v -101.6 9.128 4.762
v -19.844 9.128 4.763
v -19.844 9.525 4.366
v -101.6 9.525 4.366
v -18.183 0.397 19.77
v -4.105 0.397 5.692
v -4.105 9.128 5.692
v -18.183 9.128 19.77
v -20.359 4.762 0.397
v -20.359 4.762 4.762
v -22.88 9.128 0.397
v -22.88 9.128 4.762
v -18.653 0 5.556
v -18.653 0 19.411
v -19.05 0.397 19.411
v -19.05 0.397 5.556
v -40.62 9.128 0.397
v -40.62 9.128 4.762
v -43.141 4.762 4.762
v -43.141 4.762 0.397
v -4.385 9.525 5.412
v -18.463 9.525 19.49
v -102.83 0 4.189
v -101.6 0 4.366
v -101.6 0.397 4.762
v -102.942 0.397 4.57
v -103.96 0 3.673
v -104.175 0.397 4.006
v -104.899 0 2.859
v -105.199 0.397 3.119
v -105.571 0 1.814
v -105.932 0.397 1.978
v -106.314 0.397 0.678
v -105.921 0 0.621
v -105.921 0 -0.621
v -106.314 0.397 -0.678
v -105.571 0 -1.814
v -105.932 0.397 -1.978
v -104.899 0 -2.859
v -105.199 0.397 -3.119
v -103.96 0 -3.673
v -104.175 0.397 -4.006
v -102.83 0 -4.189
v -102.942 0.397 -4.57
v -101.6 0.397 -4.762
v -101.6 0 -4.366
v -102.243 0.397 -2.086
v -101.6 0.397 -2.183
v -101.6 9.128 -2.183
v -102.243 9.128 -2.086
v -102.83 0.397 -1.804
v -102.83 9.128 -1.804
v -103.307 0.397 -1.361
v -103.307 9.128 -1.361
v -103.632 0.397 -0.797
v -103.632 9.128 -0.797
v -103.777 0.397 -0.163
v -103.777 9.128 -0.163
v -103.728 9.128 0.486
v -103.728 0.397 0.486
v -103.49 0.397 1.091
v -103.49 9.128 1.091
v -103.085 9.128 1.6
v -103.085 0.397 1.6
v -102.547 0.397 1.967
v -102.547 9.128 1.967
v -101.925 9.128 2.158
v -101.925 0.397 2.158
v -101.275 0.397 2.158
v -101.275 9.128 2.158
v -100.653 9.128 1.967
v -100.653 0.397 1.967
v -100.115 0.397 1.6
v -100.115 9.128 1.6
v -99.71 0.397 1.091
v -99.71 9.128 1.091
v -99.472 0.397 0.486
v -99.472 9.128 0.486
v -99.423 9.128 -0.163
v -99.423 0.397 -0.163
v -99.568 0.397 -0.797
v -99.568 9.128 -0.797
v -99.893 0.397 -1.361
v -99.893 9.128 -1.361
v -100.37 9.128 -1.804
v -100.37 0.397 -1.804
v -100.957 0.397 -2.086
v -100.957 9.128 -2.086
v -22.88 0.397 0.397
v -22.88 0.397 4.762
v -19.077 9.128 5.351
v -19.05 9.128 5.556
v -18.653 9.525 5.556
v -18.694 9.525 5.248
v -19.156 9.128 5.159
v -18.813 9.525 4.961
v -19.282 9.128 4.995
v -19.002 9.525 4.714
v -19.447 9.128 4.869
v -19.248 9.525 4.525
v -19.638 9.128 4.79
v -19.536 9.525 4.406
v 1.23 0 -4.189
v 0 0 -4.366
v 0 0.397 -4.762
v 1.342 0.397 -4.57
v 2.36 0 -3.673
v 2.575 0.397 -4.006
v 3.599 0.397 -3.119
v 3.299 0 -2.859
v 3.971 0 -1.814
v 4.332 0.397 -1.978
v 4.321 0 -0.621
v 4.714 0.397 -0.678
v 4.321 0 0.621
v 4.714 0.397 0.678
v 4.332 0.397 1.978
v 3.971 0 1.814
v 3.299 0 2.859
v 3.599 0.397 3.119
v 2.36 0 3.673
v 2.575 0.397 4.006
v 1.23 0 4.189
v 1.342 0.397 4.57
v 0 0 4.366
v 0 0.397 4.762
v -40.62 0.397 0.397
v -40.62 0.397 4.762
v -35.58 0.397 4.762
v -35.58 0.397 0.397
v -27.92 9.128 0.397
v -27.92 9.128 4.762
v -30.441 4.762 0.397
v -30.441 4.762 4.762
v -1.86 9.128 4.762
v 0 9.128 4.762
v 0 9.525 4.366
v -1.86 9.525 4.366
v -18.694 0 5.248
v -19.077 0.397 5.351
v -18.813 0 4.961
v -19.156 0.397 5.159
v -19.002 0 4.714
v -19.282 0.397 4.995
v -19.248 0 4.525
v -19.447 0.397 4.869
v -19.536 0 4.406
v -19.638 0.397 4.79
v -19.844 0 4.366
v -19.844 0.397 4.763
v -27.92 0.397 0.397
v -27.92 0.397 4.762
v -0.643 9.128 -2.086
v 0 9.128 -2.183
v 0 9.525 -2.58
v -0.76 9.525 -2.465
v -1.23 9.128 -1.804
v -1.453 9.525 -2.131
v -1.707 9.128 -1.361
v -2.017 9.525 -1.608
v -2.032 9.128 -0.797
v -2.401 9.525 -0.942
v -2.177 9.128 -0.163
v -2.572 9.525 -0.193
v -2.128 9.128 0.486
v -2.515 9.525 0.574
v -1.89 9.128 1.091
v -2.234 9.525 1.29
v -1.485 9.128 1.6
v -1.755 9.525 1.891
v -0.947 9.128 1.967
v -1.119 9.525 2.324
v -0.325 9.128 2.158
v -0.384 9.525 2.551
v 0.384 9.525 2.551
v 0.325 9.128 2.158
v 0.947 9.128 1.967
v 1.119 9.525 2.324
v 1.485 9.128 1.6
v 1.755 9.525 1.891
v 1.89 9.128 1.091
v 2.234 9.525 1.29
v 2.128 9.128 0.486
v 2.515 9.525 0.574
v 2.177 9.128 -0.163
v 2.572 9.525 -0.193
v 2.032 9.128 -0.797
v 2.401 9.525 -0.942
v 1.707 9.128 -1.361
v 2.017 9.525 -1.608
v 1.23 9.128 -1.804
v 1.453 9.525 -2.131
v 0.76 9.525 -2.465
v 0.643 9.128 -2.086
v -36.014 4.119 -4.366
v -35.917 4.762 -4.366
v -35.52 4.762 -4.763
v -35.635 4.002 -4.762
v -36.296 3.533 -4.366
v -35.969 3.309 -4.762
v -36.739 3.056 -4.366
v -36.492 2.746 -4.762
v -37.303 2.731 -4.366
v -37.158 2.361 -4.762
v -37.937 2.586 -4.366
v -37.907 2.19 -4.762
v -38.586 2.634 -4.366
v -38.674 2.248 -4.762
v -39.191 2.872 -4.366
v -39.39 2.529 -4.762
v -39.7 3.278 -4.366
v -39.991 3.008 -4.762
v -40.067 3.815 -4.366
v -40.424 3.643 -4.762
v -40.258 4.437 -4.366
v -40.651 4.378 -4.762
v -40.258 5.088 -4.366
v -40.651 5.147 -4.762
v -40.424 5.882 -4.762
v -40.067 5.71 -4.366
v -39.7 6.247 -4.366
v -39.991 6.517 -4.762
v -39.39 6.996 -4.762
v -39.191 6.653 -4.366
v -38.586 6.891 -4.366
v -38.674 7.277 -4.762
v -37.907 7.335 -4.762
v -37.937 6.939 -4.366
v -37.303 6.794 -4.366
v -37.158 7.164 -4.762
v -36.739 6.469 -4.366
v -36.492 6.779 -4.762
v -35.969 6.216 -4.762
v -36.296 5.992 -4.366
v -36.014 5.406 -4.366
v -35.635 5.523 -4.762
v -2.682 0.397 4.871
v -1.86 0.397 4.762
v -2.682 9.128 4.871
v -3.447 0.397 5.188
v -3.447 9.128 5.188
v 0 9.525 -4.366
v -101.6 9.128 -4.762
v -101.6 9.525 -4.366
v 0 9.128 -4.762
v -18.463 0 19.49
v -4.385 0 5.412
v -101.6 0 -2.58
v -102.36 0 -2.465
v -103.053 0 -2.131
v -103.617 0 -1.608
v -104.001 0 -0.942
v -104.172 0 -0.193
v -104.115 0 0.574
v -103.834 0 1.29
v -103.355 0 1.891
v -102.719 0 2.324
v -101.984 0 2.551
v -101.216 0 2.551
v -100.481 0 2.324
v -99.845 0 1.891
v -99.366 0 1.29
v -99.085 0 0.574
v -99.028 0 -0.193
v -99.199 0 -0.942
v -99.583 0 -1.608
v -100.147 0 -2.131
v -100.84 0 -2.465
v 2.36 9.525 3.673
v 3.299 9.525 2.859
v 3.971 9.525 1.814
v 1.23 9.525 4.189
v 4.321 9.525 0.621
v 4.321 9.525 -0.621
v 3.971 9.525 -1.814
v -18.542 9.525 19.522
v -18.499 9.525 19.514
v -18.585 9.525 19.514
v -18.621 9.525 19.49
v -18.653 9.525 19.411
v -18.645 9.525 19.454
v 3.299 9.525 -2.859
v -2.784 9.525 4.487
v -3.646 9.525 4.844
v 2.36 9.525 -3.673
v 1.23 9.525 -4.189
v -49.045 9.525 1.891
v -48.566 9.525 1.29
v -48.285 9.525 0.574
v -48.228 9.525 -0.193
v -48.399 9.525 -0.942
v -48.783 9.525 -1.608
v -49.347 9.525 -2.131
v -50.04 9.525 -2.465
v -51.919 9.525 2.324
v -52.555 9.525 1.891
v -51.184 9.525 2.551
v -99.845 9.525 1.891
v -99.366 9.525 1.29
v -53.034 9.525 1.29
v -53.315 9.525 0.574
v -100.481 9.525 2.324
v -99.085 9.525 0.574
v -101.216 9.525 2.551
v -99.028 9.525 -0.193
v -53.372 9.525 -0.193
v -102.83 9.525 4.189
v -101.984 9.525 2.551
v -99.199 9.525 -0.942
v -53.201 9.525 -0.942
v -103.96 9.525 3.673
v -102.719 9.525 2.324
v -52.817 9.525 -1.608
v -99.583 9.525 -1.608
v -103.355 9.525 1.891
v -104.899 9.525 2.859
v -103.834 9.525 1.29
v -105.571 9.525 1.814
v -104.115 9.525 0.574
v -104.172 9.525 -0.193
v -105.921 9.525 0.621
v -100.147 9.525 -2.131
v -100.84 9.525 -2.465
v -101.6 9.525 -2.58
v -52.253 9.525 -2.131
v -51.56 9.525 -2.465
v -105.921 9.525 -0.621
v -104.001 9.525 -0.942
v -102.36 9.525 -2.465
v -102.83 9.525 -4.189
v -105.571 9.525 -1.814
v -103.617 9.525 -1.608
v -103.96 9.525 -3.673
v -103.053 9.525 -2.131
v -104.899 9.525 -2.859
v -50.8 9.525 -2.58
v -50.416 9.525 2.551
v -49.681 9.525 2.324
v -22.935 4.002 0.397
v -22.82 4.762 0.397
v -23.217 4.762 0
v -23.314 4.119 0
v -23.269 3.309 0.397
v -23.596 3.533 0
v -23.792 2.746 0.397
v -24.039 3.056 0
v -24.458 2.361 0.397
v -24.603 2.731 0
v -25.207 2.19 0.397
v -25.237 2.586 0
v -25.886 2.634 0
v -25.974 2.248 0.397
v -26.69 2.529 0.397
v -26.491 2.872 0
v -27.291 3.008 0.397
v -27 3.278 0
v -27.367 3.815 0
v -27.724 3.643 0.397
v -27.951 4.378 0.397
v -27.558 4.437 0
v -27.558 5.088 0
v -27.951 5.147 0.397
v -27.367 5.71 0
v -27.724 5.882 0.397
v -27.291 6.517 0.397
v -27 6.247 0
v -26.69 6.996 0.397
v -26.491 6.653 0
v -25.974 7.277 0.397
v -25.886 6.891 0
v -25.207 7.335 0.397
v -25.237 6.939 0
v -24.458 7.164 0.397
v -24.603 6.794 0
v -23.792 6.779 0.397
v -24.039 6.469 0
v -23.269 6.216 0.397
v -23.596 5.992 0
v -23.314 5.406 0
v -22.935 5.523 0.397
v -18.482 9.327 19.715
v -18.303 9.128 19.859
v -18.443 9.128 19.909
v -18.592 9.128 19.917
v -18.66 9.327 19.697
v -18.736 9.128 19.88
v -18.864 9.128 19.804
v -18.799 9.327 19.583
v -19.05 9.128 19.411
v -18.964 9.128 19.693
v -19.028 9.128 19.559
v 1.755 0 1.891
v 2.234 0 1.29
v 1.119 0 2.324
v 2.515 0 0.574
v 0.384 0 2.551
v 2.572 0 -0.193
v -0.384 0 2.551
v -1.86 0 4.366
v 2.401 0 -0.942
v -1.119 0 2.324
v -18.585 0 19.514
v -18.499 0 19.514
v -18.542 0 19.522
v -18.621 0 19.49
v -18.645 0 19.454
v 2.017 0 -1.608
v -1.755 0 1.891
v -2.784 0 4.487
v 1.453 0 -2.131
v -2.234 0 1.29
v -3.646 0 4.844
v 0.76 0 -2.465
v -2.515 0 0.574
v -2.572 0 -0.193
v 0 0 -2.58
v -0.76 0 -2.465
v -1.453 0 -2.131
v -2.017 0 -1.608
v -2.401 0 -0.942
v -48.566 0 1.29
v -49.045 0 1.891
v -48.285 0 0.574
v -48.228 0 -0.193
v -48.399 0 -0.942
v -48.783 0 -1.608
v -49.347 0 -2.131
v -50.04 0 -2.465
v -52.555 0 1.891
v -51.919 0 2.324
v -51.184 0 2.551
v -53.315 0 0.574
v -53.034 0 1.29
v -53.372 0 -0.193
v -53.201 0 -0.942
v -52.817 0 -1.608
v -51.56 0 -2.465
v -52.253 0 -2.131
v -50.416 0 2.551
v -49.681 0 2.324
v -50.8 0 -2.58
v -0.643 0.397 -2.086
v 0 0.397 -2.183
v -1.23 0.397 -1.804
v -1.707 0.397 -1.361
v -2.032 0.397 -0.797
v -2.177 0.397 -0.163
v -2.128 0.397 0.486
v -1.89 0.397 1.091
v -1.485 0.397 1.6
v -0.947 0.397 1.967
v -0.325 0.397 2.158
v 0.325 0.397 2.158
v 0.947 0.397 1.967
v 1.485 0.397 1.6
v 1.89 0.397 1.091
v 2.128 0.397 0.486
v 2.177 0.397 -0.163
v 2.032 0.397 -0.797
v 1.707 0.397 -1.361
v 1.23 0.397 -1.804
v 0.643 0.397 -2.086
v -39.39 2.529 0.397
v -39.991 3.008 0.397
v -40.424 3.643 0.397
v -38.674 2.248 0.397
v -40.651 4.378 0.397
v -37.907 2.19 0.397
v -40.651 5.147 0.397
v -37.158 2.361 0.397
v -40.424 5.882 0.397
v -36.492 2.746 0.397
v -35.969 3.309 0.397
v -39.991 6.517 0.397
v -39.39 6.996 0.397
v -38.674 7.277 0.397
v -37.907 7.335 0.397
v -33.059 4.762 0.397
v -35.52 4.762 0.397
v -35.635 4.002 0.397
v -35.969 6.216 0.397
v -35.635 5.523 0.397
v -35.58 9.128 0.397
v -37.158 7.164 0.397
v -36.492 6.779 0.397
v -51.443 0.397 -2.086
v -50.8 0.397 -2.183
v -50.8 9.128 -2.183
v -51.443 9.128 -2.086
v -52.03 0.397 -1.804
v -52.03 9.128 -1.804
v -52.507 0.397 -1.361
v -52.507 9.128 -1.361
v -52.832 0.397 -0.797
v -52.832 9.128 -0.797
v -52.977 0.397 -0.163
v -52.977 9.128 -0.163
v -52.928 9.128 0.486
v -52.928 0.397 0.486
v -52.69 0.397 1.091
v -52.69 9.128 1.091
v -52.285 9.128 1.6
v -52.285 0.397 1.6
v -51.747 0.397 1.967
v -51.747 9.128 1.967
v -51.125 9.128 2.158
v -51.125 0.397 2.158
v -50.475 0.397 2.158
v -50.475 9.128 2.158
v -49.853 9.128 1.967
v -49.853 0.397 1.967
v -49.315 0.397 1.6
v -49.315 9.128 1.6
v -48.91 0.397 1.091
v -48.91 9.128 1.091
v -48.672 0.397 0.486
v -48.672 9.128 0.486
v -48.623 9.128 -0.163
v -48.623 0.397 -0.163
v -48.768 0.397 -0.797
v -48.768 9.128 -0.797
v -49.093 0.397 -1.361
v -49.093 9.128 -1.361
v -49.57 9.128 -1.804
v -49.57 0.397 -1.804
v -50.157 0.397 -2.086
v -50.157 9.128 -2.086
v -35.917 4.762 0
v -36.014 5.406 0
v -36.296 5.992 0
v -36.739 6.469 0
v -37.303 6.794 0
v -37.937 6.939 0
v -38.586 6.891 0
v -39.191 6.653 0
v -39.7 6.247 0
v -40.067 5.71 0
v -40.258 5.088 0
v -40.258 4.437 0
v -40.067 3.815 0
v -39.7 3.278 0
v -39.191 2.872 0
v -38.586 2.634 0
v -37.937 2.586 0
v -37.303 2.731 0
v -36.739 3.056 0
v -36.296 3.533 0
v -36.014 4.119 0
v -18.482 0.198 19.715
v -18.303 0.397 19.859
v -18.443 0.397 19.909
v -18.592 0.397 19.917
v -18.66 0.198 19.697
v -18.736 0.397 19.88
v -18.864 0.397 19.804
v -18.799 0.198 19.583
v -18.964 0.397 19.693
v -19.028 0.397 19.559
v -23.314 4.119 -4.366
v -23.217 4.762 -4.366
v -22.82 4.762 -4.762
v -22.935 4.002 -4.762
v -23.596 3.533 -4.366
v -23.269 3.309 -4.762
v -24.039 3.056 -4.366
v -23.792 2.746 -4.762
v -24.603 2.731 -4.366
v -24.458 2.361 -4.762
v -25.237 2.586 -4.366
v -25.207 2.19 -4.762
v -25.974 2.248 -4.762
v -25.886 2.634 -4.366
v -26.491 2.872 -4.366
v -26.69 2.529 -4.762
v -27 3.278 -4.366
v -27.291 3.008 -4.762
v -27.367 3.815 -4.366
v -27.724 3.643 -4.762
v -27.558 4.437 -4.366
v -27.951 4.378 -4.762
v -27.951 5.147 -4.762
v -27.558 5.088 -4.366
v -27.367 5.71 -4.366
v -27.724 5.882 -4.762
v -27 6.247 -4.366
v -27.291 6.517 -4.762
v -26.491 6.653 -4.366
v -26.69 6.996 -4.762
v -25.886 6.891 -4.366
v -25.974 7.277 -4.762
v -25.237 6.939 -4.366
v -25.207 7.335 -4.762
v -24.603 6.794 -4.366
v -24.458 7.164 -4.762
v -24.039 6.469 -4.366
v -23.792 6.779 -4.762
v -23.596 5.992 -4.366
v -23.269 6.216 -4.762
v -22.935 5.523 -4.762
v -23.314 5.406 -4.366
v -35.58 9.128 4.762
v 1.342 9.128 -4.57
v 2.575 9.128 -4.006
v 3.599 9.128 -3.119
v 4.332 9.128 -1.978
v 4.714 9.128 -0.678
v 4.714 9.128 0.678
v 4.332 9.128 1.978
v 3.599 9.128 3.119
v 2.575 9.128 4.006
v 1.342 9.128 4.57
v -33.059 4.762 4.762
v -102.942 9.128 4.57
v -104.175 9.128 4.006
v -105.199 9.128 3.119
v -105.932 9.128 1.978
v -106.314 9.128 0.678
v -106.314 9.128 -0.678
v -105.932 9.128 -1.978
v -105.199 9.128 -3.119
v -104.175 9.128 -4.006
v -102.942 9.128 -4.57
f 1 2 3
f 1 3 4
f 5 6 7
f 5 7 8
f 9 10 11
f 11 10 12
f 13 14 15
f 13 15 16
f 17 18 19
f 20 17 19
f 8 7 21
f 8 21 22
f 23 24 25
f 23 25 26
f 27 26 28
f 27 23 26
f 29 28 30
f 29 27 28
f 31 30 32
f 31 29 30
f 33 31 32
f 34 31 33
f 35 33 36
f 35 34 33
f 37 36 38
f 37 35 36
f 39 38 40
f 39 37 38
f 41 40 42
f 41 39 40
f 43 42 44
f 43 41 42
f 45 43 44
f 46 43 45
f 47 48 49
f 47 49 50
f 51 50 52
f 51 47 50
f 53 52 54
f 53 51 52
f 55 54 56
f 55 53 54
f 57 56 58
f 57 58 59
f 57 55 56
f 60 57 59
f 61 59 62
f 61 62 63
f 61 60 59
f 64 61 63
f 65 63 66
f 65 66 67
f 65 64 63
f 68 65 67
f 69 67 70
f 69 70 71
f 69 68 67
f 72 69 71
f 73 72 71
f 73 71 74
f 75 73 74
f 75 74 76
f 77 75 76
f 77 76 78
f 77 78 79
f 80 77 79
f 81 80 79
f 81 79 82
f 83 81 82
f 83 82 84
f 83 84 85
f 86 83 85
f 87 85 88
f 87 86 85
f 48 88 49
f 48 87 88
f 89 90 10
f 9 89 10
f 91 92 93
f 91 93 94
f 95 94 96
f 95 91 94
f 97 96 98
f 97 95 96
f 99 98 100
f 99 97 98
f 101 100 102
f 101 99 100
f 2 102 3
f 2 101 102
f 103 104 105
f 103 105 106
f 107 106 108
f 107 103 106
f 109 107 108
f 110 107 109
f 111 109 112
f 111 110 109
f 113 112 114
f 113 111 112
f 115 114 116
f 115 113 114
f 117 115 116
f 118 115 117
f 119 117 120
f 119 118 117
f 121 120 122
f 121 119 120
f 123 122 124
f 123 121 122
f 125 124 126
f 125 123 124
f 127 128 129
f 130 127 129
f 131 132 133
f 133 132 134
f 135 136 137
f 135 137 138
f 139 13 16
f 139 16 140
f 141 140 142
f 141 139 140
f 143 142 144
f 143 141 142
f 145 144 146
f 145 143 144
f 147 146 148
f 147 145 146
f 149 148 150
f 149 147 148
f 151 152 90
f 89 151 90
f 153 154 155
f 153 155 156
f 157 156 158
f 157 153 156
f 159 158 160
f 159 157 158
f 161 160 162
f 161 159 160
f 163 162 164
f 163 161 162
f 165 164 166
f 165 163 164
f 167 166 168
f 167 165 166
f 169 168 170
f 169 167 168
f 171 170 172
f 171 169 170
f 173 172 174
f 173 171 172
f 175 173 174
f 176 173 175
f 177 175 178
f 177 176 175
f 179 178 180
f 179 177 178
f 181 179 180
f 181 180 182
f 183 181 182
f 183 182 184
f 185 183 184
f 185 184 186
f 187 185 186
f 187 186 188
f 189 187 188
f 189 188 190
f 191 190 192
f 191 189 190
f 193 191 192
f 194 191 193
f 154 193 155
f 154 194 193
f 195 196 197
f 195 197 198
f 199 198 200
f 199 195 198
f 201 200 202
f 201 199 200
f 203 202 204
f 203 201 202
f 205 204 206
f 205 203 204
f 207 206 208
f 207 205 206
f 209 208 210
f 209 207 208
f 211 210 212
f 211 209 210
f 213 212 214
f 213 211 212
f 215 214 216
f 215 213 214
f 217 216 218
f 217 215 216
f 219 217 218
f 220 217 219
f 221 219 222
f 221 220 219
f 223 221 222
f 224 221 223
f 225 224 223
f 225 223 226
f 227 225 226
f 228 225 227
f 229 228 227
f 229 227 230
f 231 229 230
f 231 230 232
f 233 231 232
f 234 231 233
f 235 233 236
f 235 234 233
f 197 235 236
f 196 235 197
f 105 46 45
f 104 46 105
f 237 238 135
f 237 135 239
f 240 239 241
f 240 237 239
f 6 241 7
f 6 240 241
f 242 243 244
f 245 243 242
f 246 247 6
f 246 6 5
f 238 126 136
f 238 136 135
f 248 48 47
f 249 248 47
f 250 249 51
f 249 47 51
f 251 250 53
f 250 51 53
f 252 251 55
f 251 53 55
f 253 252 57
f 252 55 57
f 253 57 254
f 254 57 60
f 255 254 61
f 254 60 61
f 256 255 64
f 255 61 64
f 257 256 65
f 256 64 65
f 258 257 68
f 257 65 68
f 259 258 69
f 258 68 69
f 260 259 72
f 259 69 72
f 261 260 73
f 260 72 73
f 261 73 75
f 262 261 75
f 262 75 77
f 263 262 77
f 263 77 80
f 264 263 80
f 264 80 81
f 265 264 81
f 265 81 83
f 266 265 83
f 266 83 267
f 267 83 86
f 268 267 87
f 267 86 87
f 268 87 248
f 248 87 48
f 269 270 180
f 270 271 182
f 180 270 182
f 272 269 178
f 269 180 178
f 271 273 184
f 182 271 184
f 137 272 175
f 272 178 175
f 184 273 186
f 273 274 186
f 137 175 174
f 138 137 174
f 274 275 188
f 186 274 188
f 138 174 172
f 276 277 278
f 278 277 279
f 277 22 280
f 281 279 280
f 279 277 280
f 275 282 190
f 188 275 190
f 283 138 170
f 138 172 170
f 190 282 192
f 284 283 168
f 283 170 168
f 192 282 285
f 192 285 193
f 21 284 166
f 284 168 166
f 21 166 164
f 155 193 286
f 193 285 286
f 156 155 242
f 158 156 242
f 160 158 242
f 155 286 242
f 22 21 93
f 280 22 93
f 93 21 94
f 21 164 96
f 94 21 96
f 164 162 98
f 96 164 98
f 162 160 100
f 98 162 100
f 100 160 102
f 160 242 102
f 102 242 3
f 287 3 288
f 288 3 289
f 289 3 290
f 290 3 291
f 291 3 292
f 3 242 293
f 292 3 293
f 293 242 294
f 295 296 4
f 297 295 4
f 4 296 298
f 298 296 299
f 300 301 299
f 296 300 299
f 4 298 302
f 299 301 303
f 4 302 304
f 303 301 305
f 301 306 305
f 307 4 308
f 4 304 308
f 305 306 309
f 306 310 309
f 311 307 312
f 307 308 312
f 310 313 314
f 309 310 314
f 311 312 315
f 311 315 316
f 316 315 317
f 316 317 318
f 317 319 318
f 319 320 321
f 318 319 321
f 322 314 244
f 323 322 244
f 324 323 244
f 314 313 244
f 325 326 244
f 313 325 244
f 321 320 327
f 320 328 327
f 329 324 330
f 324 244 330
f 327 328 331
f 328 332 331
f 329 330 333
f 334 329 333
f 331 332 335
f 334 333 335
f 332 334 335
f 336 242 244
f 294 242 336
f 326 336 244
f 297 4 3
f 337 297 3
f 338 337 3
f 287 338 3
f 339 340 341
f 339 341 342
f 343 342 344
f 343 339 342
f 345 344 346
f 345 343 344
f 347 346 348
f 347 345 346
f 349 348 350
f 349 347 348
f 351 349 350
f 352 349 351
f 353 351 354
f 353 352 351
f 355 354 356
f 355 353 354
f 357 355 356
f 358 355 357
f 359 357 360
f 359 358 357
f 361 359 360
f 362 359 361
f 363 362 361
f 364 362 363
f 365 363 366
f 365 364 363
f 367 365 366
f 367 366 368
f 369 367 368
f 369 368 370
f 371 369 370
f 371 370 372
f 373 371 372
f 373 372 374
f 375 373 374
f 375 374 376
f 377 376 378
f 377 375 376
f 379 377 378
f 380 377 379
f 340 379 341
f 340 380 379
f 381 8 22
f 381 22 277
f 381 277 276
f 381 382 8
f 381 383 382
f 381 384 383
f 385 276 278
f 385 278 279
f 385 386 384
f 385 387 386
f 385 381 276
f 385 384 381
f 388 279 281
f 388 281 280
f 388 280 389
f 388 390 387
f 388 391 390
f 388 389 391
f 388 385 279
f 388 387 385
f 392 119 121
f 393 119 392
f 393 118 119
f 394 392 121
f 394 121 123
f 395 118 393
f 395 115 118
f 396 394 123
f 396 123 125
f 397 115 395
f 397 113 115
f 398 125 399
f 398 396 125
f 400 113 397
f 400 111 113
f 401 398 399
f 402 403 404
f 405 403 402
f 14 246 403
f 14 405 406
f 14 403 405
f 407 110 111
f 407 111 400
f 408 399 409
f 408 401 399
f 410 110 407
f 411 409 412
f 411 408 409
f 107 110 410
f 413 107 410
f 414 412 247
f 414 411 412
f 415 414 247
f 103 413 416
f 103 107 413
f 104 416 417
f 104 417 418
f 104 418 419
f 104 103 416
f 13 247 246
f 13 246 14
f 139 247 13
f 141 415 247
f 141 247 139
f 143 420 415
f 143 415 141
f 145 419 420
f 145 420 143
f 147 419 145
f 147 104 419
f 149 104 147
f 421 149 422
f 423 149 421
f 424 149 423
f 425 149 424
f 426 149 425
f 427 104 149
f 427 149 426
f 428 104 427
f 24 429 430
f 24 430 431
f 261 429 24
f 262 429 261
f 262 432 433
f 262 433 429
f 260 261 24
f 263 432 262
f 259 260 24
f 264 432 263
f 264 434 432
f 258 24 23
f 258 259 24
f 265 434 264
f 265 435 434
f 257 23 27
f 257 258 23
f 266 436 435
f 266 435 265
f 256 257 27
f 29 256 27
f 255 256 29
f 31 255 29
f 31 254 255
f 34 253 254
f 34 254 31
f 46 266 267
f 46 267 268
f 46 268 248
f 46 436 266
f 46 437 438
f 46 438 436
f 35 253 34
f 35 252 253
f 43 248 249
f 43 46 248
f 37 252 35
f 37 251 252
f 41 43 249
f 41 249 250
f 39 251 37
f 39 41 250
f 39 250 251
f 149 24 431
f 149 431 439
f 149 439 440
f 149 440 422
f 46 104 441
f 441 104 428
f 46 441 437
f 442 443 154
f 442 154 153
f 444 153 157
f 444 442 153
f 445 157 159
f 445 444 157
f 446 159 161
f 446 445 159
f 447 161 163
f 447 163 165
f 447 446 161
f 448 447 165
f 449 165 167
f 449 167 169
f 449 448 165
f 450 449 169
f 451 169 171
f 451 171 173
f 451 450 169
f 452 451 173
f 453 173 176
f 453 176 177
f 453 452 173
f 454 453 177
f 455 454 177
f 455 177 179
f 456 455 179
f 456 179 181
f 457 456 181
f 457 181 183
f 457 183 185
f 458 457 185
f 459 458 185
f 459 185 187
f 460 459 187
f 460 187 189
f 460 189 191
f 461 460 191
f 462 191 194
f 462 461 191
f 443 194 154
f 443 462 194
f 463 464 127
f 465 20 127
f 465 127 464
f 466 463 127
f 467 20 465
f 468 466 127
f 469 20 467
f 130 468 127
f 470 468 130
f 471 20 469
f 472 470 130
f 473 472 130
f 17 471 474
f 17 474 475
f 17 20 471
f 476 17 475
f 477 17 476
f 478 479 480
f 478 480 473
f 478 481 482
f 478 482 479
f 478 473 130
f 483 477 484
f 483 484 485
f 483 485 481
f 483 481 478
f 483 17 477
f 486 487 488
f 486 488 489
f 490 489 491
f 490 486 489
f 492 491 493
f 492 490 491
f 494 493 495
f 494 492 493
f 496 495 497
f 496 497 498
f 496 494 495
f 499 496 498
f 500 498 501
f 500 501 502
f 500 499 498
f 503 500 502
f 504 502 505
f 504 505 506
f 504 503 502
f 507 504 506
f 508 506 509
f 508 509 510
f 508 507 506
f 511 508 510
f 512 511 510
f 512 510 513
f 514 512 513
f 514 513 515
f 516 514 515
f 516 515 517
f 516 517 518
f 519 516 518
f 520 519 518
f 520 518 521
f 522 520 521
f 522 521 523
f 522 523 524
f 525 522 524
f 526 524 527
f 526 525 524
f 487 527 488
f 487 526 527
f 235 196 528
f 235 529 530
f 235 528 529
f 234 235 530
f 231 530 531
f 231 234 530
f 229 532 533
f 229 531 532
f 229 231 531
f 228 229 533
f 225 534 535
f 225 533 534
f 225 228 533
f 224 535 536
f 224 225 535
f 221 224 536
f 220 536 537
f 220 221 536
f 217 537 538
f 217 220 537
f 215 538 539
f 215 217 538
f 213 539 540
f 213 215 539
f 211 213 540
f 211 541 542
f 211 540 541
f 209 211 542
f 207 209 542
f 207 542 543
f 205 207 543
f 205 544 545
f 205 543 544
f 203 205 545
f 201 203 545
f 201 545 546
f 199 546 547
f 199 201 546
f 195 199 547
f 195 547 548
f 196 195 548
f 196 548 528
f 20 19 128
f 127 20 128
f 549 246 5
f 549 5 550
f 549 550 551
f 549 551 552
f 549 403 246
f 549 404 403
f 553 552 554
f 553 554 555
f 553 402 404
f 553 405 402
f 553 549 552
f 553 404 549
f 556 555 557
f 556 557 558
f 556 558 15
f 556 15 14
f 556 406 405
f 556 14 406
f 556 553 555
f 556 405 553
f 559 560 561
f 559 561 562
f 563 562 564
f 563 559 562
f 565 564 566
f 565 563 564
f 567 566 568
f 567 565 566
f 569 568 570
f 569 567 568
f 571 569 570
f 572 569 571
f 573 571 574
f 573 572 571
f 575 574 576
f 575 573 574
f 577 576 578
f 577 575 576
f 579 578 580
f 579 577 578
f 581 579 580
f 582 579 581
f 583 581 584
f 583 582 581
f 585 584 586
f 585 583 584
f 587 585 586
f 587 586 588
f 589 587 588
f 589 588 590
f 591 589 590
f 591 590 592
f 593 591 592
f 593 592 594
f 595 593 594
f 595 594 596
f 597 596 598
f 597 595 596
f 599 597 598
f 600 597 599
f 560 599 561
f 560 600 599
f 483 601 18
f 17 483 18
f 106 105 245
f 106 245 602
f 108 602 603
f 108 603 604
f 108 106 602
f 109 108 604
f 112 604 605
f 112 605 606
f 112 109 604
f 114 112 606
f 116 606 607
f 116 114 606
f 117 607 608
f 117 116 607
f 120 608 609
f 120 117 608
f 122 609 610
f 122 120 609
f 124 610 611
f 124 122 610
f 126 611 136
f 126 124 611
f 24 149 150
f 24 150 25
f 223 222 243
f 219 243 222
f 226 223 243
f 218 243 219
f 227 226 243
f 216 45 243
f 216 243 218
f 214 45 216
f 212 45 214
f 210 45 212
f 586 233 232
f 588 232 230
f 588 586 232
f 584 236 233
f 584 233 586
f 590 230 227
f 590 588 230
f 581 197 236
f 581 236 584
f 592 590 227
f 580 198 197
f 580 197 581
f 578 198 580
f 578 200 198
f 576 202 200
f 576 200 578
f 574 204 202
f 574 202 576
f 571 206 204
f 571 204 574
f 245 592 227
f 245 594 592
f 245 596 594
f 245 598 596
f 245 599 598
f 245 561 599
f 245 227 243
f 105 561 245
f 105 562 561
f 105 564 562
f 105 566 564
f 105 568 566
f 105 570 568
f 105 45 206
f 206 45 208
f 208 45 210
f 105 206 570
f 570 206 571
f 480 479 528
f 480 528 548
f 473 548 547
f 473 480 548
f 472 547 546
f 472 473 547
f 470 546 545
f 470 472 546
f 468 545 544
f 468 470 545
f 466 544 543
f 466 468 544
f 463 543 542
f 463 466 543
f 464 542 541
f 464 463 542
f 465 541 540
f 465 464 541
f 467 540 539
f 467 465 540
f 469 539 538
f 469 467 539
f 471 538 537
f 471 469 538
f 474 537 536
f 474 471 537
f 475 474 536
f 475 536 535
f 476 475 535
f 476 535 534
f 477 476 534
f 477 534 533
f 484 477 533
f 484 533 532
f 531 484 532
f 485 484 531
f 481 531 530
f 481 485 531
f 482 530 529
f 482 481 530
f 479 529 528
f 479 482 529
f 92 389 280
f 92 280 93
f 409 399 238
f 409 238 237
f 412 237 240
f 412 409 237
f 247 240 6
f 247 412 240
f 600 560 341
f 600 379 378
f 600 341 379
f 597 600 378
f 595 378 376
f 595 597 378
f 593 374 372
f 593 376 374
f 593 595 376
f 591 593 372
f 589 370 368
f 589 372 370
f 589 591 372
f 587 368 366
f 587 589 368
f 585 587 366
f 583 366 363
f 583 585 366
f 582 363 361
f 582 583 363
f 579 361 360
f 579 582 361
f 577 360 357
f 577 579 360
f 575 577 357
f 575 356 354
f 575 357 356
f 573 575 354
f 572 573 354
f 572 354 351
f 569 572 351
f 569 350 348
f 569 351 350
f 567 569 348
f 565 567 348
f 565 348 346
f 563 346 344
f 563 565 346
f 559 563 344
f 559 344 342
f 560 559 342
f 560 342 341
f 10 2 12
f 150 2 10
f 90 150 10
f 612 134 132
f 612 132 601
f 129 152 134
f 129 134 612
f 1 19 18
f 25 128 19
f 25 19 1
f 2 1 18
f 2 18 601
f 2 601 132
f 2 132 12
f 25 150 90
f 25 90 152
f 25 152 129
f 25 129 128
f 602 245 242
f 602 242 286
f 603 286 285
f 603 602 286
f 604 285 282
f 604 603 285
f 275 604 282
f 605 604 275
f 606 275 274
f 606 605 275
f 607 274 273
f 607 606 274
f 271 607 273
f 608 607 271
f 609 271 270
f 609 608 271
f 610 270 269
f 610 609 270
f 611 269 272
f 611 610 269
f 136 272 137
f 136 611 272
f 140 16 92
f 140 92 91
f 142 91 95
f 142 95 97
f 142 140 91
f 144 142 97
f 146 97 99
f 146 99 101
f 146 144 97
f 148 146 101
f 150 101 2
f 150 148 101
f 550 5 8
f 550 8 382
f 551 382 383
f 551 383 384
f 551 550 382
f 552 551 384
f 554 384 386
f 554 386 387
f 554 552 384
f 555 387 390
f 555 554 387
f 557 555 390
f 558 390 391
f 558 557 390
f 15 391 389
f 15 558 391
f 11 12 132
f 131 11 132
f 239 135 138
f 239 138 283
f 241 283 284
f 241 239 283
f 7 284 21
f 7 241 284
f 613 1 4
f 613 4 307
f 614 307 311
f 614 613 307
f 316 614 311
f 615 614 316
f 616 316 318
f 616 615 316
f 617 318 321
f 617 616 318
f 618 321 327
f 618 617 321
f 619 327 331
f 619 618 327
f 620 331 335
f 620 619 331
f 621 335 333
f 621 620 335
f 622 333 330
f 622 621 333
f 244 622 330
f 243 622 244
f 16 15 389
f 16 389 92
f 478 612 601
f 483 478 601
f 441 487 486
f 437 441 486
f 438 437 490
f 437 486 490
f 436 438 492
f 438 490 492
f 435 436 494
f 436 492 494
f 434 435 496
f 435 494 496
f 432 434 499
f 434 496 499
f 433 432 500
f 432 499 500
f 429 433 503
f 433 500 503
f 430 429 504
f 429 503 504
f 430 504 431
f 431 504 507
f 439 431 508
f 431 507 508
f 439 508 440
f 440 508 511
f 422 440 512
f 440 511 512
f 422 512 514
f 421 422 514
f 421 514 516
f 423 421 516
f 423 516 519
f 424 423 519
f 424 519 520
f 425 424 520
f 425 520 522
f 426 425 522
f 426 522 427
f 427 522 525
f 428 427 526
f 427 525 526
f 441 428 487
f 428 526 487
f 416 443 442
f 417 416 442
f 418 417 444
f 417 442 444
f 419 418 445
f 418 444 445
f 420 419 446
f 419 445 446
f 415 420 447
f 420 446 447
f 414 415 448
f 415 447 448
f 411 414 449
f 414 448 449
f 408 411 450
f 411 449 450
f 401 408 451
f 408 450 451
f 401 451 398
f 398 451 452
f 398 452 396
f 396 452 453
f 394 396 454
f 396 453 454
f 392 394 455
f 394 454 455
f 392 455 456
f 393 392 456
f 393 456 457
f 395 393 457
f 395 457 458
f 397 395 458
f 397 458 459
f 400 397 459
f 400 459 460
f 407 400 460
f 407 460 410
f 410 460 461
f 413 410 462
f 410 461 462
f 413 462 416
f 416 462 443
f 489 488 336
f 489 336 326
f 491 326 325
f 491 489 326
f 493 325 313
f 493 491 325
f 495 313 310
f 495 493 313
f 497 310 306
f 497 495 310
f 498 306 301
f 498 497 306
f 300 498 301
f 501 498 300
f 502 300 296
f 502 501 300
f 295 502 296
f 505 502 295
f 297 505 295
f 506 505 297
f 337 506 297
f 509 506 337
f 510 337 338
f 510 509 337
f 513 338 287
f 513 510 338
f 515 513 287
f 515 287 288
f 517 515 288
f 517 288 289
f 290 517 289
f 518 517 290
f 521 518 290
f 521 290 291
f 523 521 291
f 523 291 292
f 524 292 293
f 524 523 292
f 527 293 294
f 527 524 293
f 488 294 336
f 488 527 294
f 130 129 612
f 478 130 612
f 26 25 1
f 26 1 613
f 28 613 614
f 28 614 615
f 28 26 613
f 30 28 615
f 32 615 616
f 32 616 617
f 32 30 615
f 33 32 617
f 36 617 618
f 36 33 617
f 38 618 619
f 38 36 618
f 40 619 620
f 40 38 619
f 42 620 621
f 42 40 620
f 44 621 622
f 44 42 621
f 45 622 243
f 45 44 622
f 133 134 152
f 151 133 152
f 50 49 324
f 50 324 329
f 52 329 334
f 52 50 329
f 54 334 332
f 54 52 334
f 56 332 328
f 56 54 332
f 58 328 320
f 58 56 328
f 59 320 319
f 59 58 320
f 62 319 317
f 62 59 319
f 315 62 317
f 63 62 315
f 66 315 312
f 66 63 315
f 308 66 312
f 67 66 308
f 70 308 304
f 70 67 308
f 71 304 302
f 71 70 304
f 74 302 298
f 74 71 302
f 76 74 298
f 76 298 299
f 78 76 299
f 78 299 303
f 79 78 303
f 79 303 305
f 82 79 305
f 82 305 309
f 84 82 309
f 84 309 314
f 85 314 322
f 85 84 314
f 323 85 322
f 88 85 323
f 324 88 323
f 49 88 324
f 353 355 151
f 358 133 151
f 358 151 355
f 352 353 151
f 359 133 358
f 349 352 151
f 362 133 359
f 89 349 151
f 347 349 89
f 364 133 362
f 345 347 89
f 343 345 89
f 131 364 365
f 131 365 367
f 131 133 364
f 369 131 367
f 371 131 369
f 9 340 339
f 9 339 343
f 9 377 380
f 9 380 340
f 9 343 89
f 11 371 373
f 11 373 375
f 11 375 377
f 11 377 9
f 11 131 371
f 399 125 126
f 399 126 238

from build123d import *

# Parameters (mm, degrees)
SKETCH1_R               = 2.1828125
BOSS_EXTRUDE1_DEPTH     = 9.525
CUT_EXTRUDE2_DEPTH      = 4.365625
CUT_EXTRUDE3_DEPTH      = 109.557926934
CUT_EXTRUDE3_DEPTH_BACK = 109.557926934
SKETCH6_R               = 2.1828125
CHAMFER1_SIZE           = 0.396875


with BuildPart() as part:
    # Sketch1 → Boss-Extrude1 (new body)
    with BuildSketch(Plane(origin=(0, 0, 0), x_dir=(1, 0, 0), z_dir=(0, 1, 0))):
        with BuildLine():
            Line((0, -4.7625), (-1.859871939, -4.7625))
            ThreePointArc((-1.859871939, -4.7625), (-3.074891837, -5.004182484), (-4.10493597, -5.69243597))
            Line((-4.10493597, -5.69243597), (-18.182789755, -19.770289755))
            ThreePointArc((-18.182789755, -19.770289755), (-18.736403184, -19.880410313), (-19.05, -19.41107951))
            Line((-19.05, -19.41107951), (-19.05, -5.55625))
            ThreePointArc((-19.05, -5.55625), (-19.282483992, -4.994983992), (-19.84375, -4.7625))
            Line((-19.84375, -4.7625), (-101.6, -4.7625))
            ThreePointArc((-101.6, -4.7625), (-106.3625, 0), (-101.6, 4.7625))
            Line((-101.6, 4.7625), (0, 4.7625))
            ThreePointArc((0, 4.7625), (4.7625, 0), (0, -4.7625))
        make_face()
        with Locations(Location((0, 0, 0), (0, 0, 90))):
            Circle(SKETCH1_R, mode=Mode.SUBTRACT)
        with Locations(Location((-50.8, 0, 0), (0, 0, 90))):
            Circle(SKETCH1_R, mode=Mode.SUBTRACT)
        with Locations(Location((-101.6, 0, 0), (0, 0, 90))):
            Circle(SKETCH1_R, mode=Mode.SUBTRACT)
    extrude(amount=BOSS_EXTRUDE1_DEPTH)

    # Sketch5 → Cut-Extrude2 (cut)
    with BuildSketch(Plane.XY.offset(4.7625)):
        Polygon((-20.359010462, 4.7625), (-22.879505231, 9.128125), (-27.920494769, 9.128125), (-30.440989538, 4.7625), (-27.920494769, 0.396875), (-22.879505231, 0.396875), align=None)
        Polygon((-33.059010462, 4.7625), (-35.579505231, 9.128125), (-40.620494769, 9.128125), (-43.140989538, 4.7625), (-40.620494769, 0.396875), (-35.579505231, 0.396875), align=None)
    extrude(amount=-CUT_EXTRUDE2_DEPTH, mode=Mode.SUBTRACT)

    # Sketch6 → Cut-Extrude3 (cut, two sides: drawn at the far end of the back side and taken through both)
    with BuildSketch(Plane.XY.offset(0.396875).offset(-CUT_EXTRUDE3_DEPTH_BACK)):
        with Locations((-38.1, 4.7625)):
            Circle(SKETCH6_R)
        with Locations((-25.4, 4.7625)):
            Circle(SKETCH6_R)
    extrude(amount=CUT_EXTRUDE3_DEPTH + CUT_EXTRUDE3_DEPTH_BACK, mode=Mode.SUBTRACT)

    # Chamfer1
    chamfer1_edges = [part.edges().sort_by_distance(p)[0] for p in [
        (-0.92993597, 0, 4.7625),
        (-3.074891837, 0, 5.004182484),
        (-11.143862862, 0, 12.731362862),
        (-18.736403184, 0, 19.880410313),
        (-19.05, 0, 12.483664755),
        (-19.282483992, 0, 4.994983992),
        (-60.721875, 0, 4.7625),
        (-106.3625, 9.525, 0),
        (-106.3625, 0, 0),
        (-50.8, 0, -4.7625),
        (4.7625, 0, 0),
        (-60.721875, 9.525, 4.7625),
        (-19.282483992, 9.525, 4.994983992),
        (-19.05, 9.525, 12.483664755),
        (0, 0, 2.1828125),
        (0, 9.525, 2.1828125),
        (-18.736403184, 9.525, 19.880410313),
        (-50.8, 0, 2.1828125),
        (-50.8, 9.525, 2.1828125),
        (-11.143862862, 9.525, 12.731362862),
        (-101.6, 0, 2.1828125),
        (-101.6, 9.525, 2.1828125),
        (-3.074891837, 9.525, 5.004182484),
        (-0.92993597, 9.525, 4.7625),
        (4.7625, 9.525, 0),
        (-40.2828125, 4.7625, 0.396875),
        (-40.2828125, 4.7625, -4.7625),
        (-27.5828125, 4.7625, 0.396875),
        (-27.5828125, 4.7625, -4.7625),
        (-50.8, 9.525, -4.7625),
    ]]
    chamfer(chamfer1_edges, length=CHAMFER1_SIZE - 0.0001)  # a hair under: the kernel refuses the full size


solid = part.part
